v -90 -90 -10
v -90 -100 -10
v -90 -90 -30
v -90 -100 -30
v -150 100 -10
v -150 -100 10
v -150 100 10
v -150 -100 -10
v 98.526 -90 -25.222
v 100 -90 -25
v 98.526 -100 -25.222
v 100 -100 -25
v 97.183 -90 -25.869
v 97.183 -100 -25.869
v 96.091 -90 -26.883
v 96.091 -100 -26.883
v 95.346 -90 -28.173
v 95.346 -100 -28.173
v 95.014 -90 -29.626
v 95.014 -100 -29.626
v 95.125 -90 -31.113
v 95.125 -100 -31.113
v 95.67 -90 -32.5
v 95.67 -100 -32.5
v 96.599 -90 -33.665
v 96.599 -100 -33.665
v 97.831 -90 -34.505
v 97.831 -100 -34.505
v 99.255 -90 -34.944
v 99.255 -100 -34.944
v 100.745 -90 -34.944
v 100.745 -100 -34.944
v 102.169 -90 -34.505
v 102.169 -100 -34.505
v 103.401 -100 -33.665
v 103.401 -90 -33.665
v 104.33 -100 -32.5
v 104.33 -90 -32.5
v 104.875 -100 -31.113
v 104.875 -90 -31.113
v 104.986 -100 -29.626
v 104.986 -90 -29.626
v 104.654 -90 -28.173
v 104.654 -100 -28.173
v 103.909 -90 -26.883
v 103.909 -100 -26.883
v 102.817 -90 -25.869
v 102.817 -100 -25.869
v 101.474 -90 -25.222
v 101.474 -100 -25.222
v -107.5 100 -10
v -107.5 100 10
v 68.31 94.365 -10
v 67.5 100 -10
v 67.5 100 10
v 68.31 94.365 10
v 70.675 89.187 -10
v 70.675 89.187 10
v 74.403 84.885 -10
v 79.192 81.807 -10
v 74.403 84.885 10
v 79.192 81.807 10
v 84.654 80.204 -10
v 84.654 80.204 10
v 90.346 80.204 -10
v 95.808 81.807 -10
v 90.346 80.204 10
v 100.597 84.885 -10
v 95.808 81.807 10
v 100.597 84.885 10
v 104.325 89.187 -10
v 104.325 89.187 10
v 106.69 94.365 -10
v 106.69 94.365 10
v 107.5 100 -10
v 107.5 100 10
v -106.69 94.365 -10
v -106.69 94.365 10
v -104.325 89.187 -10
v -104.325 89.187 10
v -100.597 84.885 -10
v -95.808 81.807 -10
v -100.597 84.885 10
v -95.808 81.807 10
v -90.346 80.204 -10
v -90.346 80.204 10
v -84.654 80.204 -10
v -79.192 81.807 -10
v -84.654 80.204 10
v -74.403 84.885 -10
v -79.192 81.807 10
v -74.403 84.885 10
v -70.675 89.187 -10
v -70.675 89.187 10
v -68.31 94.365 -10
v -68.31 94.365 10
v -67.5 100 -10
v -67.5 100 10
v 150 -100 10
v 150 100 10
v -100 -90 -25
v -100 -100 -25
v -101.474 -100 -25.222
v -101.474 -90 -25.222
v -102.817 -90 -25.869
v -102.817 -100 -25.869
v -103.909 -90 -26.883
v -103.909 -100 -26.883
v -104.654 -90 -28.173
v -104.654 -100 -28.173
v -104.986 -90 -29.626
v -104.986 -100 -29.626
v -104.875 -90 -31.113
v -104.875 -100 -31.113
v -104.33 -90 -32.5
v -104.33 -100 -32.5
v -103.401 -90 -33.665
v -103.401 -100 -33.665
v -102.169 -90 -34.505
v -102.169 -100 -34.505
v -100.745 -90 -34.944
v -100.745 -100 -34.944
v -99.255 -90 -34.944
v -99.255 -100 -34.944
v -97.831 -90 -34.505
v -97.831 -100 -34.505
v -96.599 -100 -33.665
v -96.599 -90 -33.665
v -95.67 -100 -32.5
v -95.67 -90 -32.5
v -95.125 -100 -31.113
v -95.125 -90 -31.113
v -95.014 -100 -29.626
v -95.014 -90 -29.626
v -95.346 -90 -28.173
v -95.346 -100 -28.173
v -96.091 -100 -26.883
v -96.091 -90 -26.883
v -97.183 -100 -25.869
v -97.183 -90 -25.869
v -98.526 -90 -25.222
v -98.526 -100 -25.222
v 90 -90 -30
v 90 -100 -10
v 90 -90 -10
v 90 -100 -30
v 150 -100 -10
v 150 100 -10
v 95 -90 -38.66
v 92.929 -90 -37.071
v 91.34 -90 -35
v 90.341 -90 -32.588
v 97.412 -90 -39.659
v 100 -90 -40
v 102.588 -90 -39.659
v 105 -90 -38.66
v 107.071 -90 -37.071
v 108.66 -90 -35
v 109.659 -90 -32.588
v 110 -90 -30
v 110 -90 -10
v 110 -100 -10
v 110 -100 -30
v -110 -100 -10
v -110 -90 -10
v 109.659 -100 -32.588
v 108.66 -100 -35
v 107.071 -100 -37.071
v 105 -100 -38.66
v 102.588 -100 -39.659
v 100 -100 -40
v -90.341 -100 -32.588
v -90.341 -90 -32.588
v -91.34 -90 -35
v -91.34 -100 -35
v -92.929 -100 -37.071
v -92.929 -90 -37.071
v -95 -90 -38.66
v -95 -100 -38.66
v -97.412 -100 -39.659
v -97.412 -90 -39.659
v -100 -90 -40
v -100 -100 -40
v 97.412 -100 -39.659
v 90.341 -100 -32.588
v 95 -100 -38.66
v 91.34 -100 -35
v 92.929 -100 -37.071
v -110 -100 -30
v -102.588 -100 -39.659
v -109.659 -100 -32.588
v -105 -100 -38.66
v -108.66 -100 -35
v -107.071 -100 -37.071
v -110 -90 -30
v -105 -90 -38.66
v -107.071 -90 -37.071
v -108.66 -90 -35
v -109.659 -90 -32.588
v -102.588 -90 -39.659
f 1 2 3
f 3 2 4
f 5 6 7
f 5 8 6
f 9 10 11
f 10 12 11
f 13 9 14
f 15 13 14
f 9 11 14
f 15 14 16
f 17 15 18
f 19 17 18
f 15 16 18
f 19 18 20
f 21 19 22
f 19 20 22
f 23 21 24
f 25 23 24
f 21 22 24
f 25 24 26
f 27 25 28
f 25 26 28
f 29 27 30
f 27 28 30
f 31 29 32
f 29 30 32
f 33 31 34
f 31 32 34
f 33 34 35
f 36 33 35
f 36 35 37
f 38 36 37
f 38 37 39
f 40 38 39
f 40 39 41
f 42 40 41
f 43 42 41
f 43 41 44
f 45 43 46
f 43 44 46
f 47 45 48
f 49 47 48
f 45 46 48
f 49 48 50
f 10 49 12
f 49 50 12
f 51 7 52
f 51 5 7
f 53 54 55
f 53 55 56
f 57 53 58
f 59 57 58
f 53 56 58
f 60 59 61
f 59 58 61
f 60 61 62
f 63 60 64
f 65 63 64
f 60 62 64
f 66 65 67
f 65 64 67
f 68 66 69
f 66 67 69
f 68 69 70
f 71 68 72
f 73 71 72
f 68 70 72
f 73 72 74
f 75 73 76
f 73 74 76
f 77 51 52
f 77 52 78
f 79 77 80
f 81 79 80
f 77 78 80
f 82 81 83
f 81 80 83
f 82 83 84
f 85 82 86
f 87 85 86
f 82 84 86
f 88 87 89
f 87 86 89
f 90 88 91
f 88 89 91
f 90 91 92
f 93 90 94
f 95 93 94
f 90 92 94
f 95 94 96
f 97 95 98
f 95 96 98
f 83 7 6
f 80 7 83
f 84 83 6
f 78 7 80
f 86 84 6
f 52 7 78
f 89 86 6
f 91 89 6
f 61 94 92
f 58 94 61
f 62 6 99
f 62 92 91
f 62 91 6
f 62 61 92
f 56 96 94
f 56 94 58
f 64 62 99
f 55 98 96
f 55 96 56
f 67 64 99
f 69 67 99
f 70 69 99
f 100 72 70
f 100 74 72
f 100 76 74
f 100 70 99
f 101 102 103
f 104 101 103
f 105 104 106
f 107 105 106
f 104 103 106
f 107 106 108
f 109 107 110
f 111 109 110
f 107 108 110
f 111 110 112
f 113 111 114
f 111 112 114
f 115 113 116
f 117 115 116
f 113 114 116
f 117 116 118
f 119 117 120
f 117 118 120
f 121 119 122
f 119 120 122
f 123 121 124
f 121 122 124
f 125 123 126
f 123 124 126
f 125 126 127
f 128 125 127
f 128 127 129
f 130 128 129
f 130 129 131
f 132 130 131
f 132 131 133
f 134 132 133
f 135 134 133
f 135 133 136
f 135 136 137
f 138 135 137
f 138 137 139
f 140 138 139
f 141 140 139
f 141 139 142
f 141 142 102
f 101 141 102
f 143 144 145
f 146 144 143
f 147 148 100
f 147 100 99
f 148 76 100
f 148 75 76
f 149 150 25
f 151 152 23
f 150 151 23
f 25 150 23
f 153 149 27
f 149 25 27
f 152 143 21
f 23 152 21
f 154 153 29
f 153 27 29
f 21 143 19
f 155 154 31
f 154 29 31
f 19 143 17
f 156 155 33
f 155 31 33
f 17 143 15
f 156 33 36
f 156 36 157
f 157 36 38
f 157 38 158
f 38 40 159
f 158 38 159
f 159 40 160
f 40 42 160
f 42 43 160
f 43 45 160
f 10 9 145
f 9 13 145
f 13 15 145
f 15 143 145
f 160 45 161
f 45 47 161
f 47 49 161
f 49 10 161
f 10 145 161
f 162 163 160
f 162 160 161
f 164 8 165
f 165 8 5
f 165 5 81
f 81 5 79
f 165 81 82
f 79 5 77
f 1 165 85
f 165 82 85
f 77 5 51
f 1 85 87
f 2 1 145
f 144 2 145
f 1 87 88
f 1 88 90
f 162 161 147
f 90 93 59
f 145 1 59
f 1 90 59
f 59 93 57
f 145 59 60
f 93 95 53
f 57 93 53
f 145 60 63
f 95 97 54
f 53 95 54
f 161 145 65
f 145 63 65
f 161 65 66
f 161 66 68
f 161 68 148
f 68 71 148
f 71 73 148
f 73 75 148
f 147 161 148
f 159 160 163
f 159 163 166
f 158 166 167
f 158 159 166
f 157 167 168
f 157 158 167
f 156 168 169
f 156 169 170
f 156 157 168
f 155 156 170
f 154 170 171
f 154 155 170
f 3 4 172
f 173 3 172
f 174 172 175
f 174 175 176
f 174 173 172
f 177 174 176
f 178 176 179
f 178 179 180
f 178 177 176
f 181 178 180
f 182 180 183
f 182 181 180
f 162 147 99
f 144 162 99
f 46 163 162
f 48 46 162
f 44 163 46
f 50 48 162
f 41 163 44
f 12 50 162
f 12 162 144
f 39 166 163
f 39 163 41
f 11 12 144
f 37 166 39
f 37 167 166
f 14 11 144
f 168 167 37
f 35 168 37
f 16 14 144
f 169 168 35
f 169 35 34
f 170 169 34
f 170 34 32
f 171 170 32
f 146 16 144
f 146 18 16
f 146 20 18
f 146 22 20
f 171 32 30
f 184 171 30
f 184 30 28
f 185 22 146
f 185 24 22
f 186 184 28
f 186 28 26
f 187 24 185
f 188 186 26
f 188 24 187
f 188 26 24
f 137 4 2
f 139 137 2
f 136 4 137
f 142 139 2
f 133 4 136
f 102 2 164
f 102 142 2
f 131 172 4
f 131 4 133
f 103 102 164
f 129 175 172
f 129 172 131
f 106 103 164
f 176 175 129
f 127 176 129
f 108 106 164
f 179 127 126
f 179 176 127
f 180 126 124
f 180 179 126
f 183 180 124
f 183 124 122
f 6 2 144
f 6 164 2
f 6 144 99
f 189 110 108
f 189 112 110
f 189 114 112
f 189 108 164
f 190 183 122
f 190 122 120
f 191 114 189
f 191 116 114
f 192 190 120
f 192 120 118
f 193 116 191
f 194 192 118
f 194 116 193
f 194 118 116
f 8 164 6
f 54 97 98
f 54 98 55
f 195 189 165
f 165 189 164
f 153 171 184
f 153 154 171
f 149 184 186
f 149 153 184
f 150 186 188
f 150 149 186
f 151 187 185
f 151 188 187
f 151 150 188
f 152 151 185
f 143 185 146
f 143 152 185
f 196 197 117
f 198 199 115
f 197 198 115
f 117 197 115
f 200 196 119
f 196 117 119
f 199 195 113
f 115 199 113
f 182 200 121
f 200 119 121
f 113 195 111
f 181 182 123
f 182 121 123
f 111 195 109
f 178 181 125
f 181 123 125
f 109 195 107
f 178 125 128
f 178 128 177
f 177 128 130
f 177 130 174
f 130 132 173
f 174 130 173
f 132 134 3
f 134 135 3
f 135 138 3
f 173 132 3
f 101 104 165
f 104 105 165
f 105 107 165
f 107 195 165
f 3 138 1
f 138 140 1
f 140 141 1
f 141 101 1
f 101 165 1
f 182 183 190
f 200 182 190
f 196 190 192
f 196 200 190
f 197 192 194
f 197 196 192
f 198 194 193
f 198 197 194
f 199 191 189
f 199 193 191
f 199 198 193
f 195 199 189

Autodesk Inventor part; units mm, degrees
ref_plane "YZ Plane" through (0, 0, 0) normal (1, 0, 0) x (0, 1, 0)
ref_plane "XZ Plane" through (0, 0, 0) normal (0, 1, 0) x (-1, 0, 0)
ref_plane "XY Plane" through (0, 0, 0) normal (0, 0, 1) x (1, 0, 0)
sketch "草图1" plane through (0, 0, 0) normal (0, 0, 1) x (1, 0, 0)
  line L0 (150, -100) -> (-150, -100)
  line L1 (-150, -100) -> (-150, 100)
  line L2 (-150, 100) -> (150, 100)
  line L3 (150, 100) -> (150, -100)
  line L4 (150, -100) -> (-150, 100) construction
  line L5 (-150, -100) -> (150, 100) construction
  point P0 (0, 0)
  dimension "d0" = 300
  dimension "d1" = 200
extrude "拉伸1" add sketch "草图1" along normal mid plane 20
sketch "草图2" plane through (0, 0, 10) normal (0, 0, 1) x (1, 0, 0)
  line L0 (150, 100) -> (-150, 100) construction
  line L1 (-150, 100) -> (-150, -100) construction
  line L2 (-150, -100) -> (150, -100) construction
  line L3 (150, -100) -> (150, 100) construction
  line L4 (150, 100) -> (-150, 100) construction
  circle A0 centre (-87.5, 100) radius 20
  line L5 (0, 0) -> (0, 160.0465) construction
  circle A1 centre (87.5, 100) radius 20
  dimension "d4" = 40
  dimension "d5" = 175
extrude "拉伸2" cut sketch "草图2" against normal blind 20
sketch "草图3" plane through (-150, -100, 10) normal (0, -1, 0) x (1, 0, 0)
  line L0 (300, -20) -> (300, 0) construction
  line L1 (0, 0) -> (300, 0) construction
  line L2 (0, -20) -> (0, 0) construction
  line L3 (300, -20) -> (0, -20) construction
  line L4 (0, -20) -> (42.5, -20) projected
  line L5 (150, -10) -> (150, 57.6375)
  line L6 (300, -20) -> (300, 0) construction
  line L7 (300, -20) -> (257.5, -20) construction
  line L8 (0, 0) -> (300, 0) projected
  line L9 (40, 0) -> (60, 0)
  line L10 (60, 0) -> (60, -50)
  line L11 (60, -50) -> (40, -50)
  line L12 (40, -50) -> (40, 0)
  line L13 (300, -20) -> (300, 0) construction
  line L14 (300, -20) -> (257.5, -20)
  line L15 (260, 0) -> (240, 0)
  line L16 (240, 0) -> (240, -50)
  line L17 (240, -50) -> (260, -50)
  line L18 (260, -50) -> (260, 0)
  point P0 (260, 0)
  point P1 (240, 0)
  dimension "d20" = 20
  dimension "d21" = 50
  dimension "d22" = 180
extrude "拉伸4" add sketch "草图3" against normal blind 10
full round fillet "全圆角3" first side at (110, -96.6667, -30) centre faces at (96.6667, -96.6667, -40) second side at (90, -96.6667, -20)
mirror "镜像1" about plane through (0, 0, 0) normal (1, 0, 0) of "全圆角3"
sketch "草图5" plane through (-150, -90, 10) normal (0, 1, 0) x (1, 0, 0)
  arc A0 (260, 40) -> (240, 40) centre (250, 40) ccw projected
  arc A1 (60, 40) -> (40, 40) centre (50, 40) ccw projected
  point P0 (150, 10)
hole "孔2" at (100, -90, -30) at (-100, -90, -30) direction (0, -1, 0) diameter 10 end through all
properties part number "支撑板1"
